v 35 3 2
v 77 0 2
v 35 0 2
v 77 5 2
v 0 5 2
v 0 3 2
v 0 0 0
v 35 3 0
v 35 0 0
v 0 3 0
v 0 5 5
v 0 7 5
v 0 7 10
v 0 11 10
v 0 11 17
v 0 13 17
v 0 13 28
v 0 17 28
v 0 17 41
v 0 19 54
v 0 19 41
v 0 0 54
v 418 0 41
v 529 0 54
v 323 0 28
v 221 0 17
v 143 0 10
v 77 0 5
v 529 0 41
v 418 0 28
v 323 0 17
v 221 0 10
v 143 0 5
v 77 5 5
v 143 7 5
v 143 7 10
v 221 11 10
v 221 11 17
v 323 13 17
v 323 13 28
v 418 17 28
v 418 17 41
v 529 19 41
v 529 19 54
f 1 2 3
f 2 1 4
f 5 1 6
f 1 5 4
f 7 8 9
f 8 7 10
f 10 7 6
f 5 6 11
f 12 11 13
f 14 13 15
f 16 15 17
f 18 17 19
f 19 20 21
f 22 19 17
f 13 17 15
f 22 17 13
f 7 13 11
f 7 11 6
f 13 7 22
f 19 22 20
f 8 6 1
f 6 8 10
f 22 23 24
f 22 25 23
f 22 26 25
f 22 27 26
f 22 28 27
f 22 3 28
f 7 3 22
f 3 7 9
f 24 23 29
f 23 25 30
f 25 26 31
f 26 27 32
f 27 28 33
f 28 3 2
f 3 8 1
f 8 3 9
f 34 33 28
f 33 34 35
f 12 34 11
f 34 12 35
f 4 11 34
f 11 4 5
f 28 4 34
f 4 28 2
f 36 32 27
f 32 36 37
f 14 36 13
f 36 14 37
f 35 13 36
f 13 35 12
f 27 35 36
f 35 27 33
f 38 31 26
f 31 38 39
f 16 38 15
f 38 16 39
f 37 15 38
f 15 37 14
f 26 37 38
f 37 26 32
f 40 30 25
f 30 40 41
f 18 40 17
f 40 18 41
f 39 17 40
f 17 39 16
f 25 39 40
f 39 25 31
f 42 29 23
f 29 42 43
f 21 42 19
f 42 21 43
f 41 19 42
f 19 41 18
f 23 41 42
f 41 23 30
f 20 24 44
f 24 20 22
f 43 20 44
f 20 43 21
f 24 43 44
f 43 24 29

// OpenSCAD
translate([2.5, 1.5, 1.0]) color([0.9283213646369055, 0.3819290956458814, 0.8073817566064733]) cube([5, 3, 2], center=true);
translate([7.5, 1.5, 1.0]) color([0.4358135328449577, 0.3812446666960848, 0.7653480547755614]) cube([5, 3, 2], center=true);
translate([12.5, 1.5, 1.0]) color([0.6157609965990255, 0.269317694221085, 0.5828105982174631]) cube([5, 3, 2], center=true);
translate([17.5, 1.5, 1.0]) color([0.7038528499563493, 0.8270780916312745, 0.6771790791594404]) cube([5, 3, 2], center=true);
translate([22.5, 1.5, 1.0]) color([0.6407470713136978, 0.5959023424761803, 0.09205094912438294]) cube([5, 3, 2], center=true);
translate([27.5, 1.5, 1.0]) color([0.9451890595499945, 0.7148419104776332, 0.27287112939455904]) cube([5, 3, 2], center=true);
translate([32.5, 1.5, 1.0]) color([0.6923506941042633, 0.6208174360700806, 0.6588514457337878]) cube([5, 3, 2], center=true);
translate([3.5, 2.5, 3.5]) color([0.37890897100484955, 0.5731758548011724, 0.6600272306765387]) cube([7, 5, 3], center=true);
translate([10.5, 2.5, 3.5]) color([0.2016560690192294, 0.5080121643868843, 0.12034165531097496]) cube([7, 5, 3], center=true);
translate([17.5, 2.5, 3.5]) color([0.10553049812559656, 0.9110605752066594, 0.12454722455886658]) cube([7, 5, 3], center=true);
translate([24.5, 2.5, 3.5]) color([0.8932669717646426, 0.46979919954147975, 0.45490261575411783]) cube([7, 5, 3], center=true);
translate([31.5, 2.5, 3.5]) color([0.339815319544686, 0.4162177164437951, 0.3772323807965956]) cube([7, 5, 3], center=true);
translate([38.5, 2.5, 3.5]) color([0.5649829470026478, 0.3355933190888857, 0.821975863451304]) cube([7, 5, 3], center=true);
translate([45.5, 2.5, 3.5]) color([0.23356175015719005, 0.2484701227474857, 0.4805515466274325]) cube([7, 5, 3], center=true);
translate([52.5, 2.5, 3.5]) color([0.9350812838247559, 0.023915674142529042, 0.7234136155845775]) cube([7, 5, 3], center=true);
translate([59.5, 2.5, 3.5]) color([0.006006587687610199, 0.40486021309029363, 0.7642072496955172]) cube([7, 5, 3], center=true);
translate([66.5, 2.5, 3.5]) color([0.446079121708747, 0.4294889289219638, 0.2532168289812803]) cube([7, 5, 3], center=true);
translate([73.5, 2.5, 3.5]) color([0.4750956381931334, 0.2282594996758467, 0.28352128982526903]) cube([7, 5, 3], center=true);
translate([5.5, 3.5, 7.5]) color([0.65329356108744, 0.5994470561435099, 0.9295455153942724]) cube([11, 7, 5], center=true);
translate([16.5, 3.5, 7.5]) color([0.9688690813748525, 0.5223801932074086, 0.087556512561491]) cube([11, 7, 5], center=true);
translate([27.5, 3.5, 7.5]) color([0.2999030942676174, 0.5178048955716449, 0.673162893375426]) cube([11, 7, 5], center=true);
translate([38.5, 3.5, 7.5]) color([0.9461972494348655, 0.15510743366786006, 0.036684701848330725]) cube([11, 7, 5], center=true);
translate([49.5, 3.5, 7.5]) color([0.8700356827809361, 0.8051643681552639, 0.7657482765617637]) cube([11, 7, 5], center=true);
translate([60.5, 3.5, 7.5]) color([0.4686007677785966, 0.6777807041081183, 0.4114692248113424]) cube([11, 7, 5], center=true);
translate([71.5, 3.5, 7.5]) color([0.1920516577922634, 0.3908937651450439, 0.7870465960212608]) cube([11, 7, 5], center=true);
translate([82.5, 3.5, 7.5]) color([0.8018556220245565, 0.9611344660741371, 0.8876671251642707]) cube([11, 7, 5], center=true);
translate([93.5, 3.5, 7.5]) color([0.6820845367745056, 0.5209120227965948, 0.7239270234707854]) cube([11, 7, 5], center=true);
translate([104.5, 3.5, 7.5]) color([0.18320358931429992, 0.9230845312981147, 0.712576574469464]) cube([11, 7, 5], center=true);
translate([115.5, 3.5, 7.5]) color([0.5944855554602619, 0.4340417172919838, 0.633541589146366]) cube([11, 7, 5], center=true);
translate([126.5, 3.5, 7.5]) color([0.6176787279057826, 0.8988541265070673, 0.5707363108456612]) cube([11, 7, 5], center=true);
translate([137.5, 3.5, 7.5]) color([0.21337715236890142, 0.4413793610998017, 0.24296851074515258]) cube([11, 7, 5], center=true);
translate([6.5, 5.5, 13.5]) color([0.904950168758396, 0.8435258143967945, 0.5558191145293447]) cube([13, 11, 7], center=true);
translate([19.5, 5.5, 13.5]) color([0.19639156759168497, 0.04354201303619698, 0.13416945370174738]) cube([13, 11, 7], center=true);
translate([32.5, 5.5, 13.5]) color([0.4432192807954288, 0.6742040783909912, 0.2239981044890822]) cube([13, 11, 7], center=true);
translate([45.5, 5.5, 13.5]) color([0.6845203497190341, 0.8619493839565875, 0.7572410815635461]) cube([13, 11, 7], center=true);
translate([58.5, 5.5, 13.5]) color([0.42552747521256473, 0.6457279073749899, 0.9883674329995545]) cube([13, 11, 7], center=true);
translate([71.5, 5.5, 13.5]) color([0.8854116028772656, 0.3381495065497585, 0.6854470535527631]) cube([13, 11, 7], center=true);
translate([84.5, 5.5, 13.5]) color([0.16321128139375318, 0.5573684710505447, 0.35653396485377764]) cube([13, 11, 7], center=true);
translate([97.5, 5.5, 13.5]) color([0.4381463184268606, 0.4388988538833267, 0.6632329398209382]) cube([13, 11, 7], center=true);
translate([110.5, 5.5, 13.5]) color([0.8459960072625369, 0.46857184221836334, 0.14658478811214992]) cube([13, 11, 7], center=true);
translate([123.5, 5.5, 13.5]) color([0.7541542732216177, 0.7516430106443925, 0.9538452397018827]) cube([13, 11, 7], center=true);
translate([136.5, 5.5, 13.5]) color([0.3940560068988097, 0.46387900939400595, 0.5405957416446505]) cube([13, 11, 7], center=true);
translate([149.5, 5.5, 13.5]) color([0.89212339645532, 0.7042165178552502, 0.02127812360330028]) cube([13, 11, 7], center=true);
translate([162.5, 5.5, 13.5]) color([0.2073226875630637, 0.853894847723373, 0.5854738173604882]) cube([13, 11, 7], center=true);
translate([175.5, 5.5, 13.5]) color([0.873908466031562, 0.41139913753303803, 0.2104678871734329]) cube([13, 11, 7], center=true);
translate([188.5, 5.5, 13.5]) color([0.004140726929070526, 0.9960509588477288, 0.13638153322666624]) cube([13, 11, 7], center=true);
translate([201.5, 5.5, 13.5]) color([0.6429687656941175, 0.48970891020172747, 0.3801493908756587]) cube([13, 11, 7], center=true);
translate([214.5, 5.5, 13.5]) color([0.5372021501216685, 0.07828356031214012, 0.9700342024153565]) cube([13, 11, 7], center=true);
translate([8.5, 6.5, 22.5]) color([0.49273694122051404, 0.015289516776476164, 0.4193434314207244]) cube([17, 13, 11], center=true);
translate([25.5, 6.5, 22.5]) color([0.757201905250635, 0.3120836696305366, 0.74502240883734]) cube([17, 13, 11], center=true);
translate([42.5, 6.5, 22.5]) color([0.767362719837536, 0.23912071894008513, 0.9679724862095583]) cube([17, 13, 11], center=true);
translate([59.5, 6.5, 22.5]) color([0.02788874944966646, 0.8636054840560119, 0.5126491216384761]) cube([17, 13, 11], center=true);
translate([76.5, 6.5, 22.5]) color([0.1533794884812224, 0.2583929457529298, 0.5935172918971846]) cube([17, 13, 11], center=true);
translate([93.5, 6.5, 22.5]) color([0.27845716385566655, 0.8384210763946544, 0.2195285140180392]) cube([17, 13, 11], center=true);
translate([110.5, 6.5, 22.5]) color([0.3840612973718244, 0.5068131679847862, 0.3397729637347646]) cube([17, 13, 11], center=true);
translate([127.5, 6.5, 22.5]) color([0.8241428031789603, 0.2638822044103527, 0.08897717329866861]) cube([17, 13, 11], center=true);
translate([144.5, 6.5, 22.5]) color([0.15478518840325006, 0.6269454552544671, 0.5635626501220461]) cube([17, 13, 11], center=true);
translate([161.5, 6.5, 22.5]) color([0.0632983219267329, 0.9930491635748301, 0.47944063272103155]) cube([17, 13, 11], center=true);
translate([178.5, 6.5, 22.5]) color([0.31943720121332564, 0.7291624014985916, 0.024291858945771794]) cube([17, 13, 11], center=true);
translate([195.5, 6.5, 22.5]) color([0.4342491448458661, 0.664413839099525, 0.9621362249074848]) cube([17, 13, 11], center=true);
translate([212.5, 6.5, 22.5]) color([0.7616377781461243, 0.8851592096024911, 0.11890590716525107]) cube([17, 13, 11], center=true);
translate([229.5, 6.5, 22.5]) color([0.4297706056228291, 0.03179042510182062, 0.27199419784669565]) cube([17, 13, 11], center=true);
translate([246.5, 6.5, 22.5]) color([0.3842968651311809, 0.3438210807117045, 0.37374079686535155]) cube([17, 13, 11], center=true);
translate([263.5, 6.5, 22.5]) color([0.8030800047305061, 0.1895436327536002, 0.8244956101605165]) cube([17, 13, 11], center=true);
translate([280.5, 6.5, 22.5]) color([0.5419210870534598, 0.33874512847804994, 0.5522357673492562]) cube([17, 13, 11], center=true);
translate([297.5, 6.5, 22.5]) color([0.1614233323040356, 0.4954547496102897, 0.02195329693820869]) cube([17, 13, 11], center=true);
translate([314.5, 6.5, 22.5]) color([0.8629750777621416, 0.3315810347919772, 0.3440429493469712]) cube([17, 13, 11], center=true);
translate([9.5, 8.5, 34.5]) color([0.9951519973525604, 0.6134557318779851, 0.41765369441588684]) cube([19, 17, 13], center=true);
translate([28.5, 8.5, 34.5]) color([0.7906567212777874, 0.06766470709087935, 0.5705042042150394]) cube([19, 17, 13], center=true);
translate([47.5, 8.5, 34.5]) color([0.5207009619107998, 0.8612281680032071, 0.586200342537922]) cube([19, 17, 13], center=true);
translate([66.5, 8.5, 34.5]) color([0.4852724152405492, 0.520225858991121, 0.781897308106658]) cube([19, 17, 13], center=true);
translate([85.5, 8.5, 34.5]) color([0.34732079578053854, 0.5577894139017036, 0.7073902727437412]) cube([19, 17, 13], center=true);
translate([104.5, 8.5, 34.5]) color([0.9955554543226288, 0.6936841954541374, 0.9618711712222828]) cube([19, 17, 13], center=true);
translate([123.5, 8.5, 34.5]) color([0.39903266132924864, 0.6087809927641015, 0.7452948573156023]) cube([19, 17, 13], center=true);
translate([142.5, 8.5, 34.5]) color([0.3484159496274708, 0.26917493880360543, 0.9728331110968115]) cube([19, 17, 13], center=true);
translate([161.5, 8.5, 34.5]) color([0.3485339729028927, 0.9999026771431976, 0.8522709846555646]) cube([19, 17, 13], center=true);
translate([180.5, 8.5, 34.5]) color([0.21606811483003152, 0.828219222379738, 0.983627126577976]) cube([19, 17, 13], center=true);
translate([199.5, 8.5, 34.5]) color([0.27682022423370123, 0.6644544137730121, 0.7695892229710263]) cube([19, 17, 13], center=true);
translate([218.5, 8.5, 34.5]) color([0.08328199878548848, 0.8193318048721658, 0.3083607321398538]) cube([19, 17, 13], center=true);
translate([237.5, 8.5, 34.5]) color([0.7063817961665891, 0.9501382211094213, 0.03510902139968519]) cube([19, 17, 13], center=true);
translate([256.5, 8.5, 34.5]) color([0.6117128805378089, 0.2924046278249367, 0.11465878908695704]) cube([19, 17, 13], center=true);
translate([275.5, 8.5, 34.5]) color([0.7118548026331178, 0.9790465623245286, 0.5127105009158898]) cube([19, 17, 13], center=true);
translate([294.5, 8.5, 34.5]) color([0.3463442092021397, 0.449089594847772, 0.4146178849244797]) cube([19, 17, 13], center=true);
translate([313.5, 8.5, 34.5]) color([0.5319019096455277, 0.4091758364640784, 0.08037246460892689]) cube([19, 17, 13], center=true);
translate([332.5, 8.5, 34.5]) color([0.979427735976566, 0.9967072779247954, 0.174134554688386]) cube([19, 17, 13], center=true);
translate([351.5, 8.5, 34.5]) color([0.24103996625784163, 0.4369562914493026, 0.6987329370284997]) cube([19, 17, 13], center=true);
translate([370.5, 8.5, 34.5]) color([0.0313449354686236, 0.8354975507275829, 0.6384333733145956]) cube([19, 17, 13], center=true);
translate([389.5, 8.5, 34.5]) color([0.2692935621453354, 0.8708672149169422, 0.6612092130863187]) cube([19, 17, 13], center=true);
translate([408.5, 8.5, 34.5]) color([0.31692428125223226, 0.5478459943346068, 0.9792375585990726]) cube([19, 17, 13], center=true);
translate([11.5, 9.5, 47.5]) color([0.04843296694217536, 0.7084620166481488, 0.8494136101627382]) cube([23, 19, 13], center=true);
translate([34.5, 9.5, 47.5]) color([0.6923168489084026, 0.14001841291466244, 0.5971496034867149]) cube([23, 19, 13], center=true);
translate([57.5, 9.5, 47.5]) color([0.785955245708034, 0.41859591216501624, 0.5824282782185067]) cube([23, 19, 13], center=true);
translate([80.5, 9.5, 47.5]) color([0.2534679543286823, 0.3127485507020873, 0.8085701430797193]) cube([23, 19, 13], center=true);
translate([103.5, 9.5, 47.5]) color([0.4894981376035834, 0.4488117375095664, 0.12288383710126849]) cube([23, 19, 13], center=true);
translate([126.5, 9.5, 47.5]) color([0.37447089828204916, 0.5207210559493618, 0.23101233472084515]) cube([23, 19, 13], center=true);
translate([149.5, 9.5, 47.5]) color([0.8079355618157972, 0.3837007062927431, 0.23848979235515844]) cube([23, 19, 13], center=true);
translate([172.5, 9.5, 47.5]) color([0.3082974932970215, 0.8244635327355437, 0.9041434759548311]) cube([23, 19, 13], center=true);
translate([195.5, 9.5, 47.5]) color([0.9602978485649007, 0.015194079976650898, 0.7538941306037736]) cube([23, 19, 13], center=true);
translate([218.5, 9.5, 47.5]) color([0.5254840360127734, 0.1245600769470302, 0.24653357639784446]) cube([23, 19, 13], center=true);
translate([241.5, 9.5, 47.5]) color([0.2816908305030399, 0.40421668761599394, 0.4707212723596702]) cube([23, 19, 13], center=true);
translate([264.5, 9.5, 47.5]) color([0.9367888564384516, 0.05835505697304211, 0.7091693050184652]) cube([23, 19, 13], center=true);
translate([287.5, 9.5, 47.5]) color([0.8541060948687346, 0.3572999179546772, 0.24921719842516166]) cube([23, 19, 13], center=true);
translate([310.5, 9.5, 47.5]) color([0.22130849062598557, 0.30083917669109705, 0.14529799063712556]) cube([23, 19, 13], center=true);
translate([333.5, 9.5, 47.5]) color([0.5516779868522678, 0.2503995041859852, 0.02725153551436621]) cube([23, 19, 13], center=true);
translate([356.5, 9.5, 47.5]) color([0.23263343322418595, 0.8206321054828926, 0.4173702219519555]) cube([23, 19, 13], center=true);
translate([379.5, 9.5, 47.5]) color([0.8835362546535589, 0.94361563143763, 0.2433483284582103]) cube([23, 19, 13], center=true);
translate([402.5, 9.5, 47.5]) color([0.5599724510969238, 0.8810669096802846, 0.581420337268773]) cube([23, 19, 13], center=true);
translate([425.5, 9.5, 47.5]) color([0.16800028640767228, 0.24795324745785607, 0.9876248298134623]) cube([23, 19, 13], center=true);
translate([448.5, 9.5, 47.5]) color([0.29938686489017896, 0.8677029822430992, 0.7950123377807312]) cube([23, 19, 13], center=true);
translate([471.5, 9.5, 47.5]) color([0.7419847028034536, 0.7219422568446254, 0.7899818636836725]) cube([23, 19, 13], center=true);
translate([494.5, 9.5, 47.5]) color([0.8474076852186397, 0.06236643651158369, 0.167809824504079]) cube([23, 19, 13], center=true);
translate([517.5, 9.5, 47.5]) color([0.5055293246202428, 0.21248952586060588, 0.5332180226305999]) cube([23, 19, 13], center=true);
